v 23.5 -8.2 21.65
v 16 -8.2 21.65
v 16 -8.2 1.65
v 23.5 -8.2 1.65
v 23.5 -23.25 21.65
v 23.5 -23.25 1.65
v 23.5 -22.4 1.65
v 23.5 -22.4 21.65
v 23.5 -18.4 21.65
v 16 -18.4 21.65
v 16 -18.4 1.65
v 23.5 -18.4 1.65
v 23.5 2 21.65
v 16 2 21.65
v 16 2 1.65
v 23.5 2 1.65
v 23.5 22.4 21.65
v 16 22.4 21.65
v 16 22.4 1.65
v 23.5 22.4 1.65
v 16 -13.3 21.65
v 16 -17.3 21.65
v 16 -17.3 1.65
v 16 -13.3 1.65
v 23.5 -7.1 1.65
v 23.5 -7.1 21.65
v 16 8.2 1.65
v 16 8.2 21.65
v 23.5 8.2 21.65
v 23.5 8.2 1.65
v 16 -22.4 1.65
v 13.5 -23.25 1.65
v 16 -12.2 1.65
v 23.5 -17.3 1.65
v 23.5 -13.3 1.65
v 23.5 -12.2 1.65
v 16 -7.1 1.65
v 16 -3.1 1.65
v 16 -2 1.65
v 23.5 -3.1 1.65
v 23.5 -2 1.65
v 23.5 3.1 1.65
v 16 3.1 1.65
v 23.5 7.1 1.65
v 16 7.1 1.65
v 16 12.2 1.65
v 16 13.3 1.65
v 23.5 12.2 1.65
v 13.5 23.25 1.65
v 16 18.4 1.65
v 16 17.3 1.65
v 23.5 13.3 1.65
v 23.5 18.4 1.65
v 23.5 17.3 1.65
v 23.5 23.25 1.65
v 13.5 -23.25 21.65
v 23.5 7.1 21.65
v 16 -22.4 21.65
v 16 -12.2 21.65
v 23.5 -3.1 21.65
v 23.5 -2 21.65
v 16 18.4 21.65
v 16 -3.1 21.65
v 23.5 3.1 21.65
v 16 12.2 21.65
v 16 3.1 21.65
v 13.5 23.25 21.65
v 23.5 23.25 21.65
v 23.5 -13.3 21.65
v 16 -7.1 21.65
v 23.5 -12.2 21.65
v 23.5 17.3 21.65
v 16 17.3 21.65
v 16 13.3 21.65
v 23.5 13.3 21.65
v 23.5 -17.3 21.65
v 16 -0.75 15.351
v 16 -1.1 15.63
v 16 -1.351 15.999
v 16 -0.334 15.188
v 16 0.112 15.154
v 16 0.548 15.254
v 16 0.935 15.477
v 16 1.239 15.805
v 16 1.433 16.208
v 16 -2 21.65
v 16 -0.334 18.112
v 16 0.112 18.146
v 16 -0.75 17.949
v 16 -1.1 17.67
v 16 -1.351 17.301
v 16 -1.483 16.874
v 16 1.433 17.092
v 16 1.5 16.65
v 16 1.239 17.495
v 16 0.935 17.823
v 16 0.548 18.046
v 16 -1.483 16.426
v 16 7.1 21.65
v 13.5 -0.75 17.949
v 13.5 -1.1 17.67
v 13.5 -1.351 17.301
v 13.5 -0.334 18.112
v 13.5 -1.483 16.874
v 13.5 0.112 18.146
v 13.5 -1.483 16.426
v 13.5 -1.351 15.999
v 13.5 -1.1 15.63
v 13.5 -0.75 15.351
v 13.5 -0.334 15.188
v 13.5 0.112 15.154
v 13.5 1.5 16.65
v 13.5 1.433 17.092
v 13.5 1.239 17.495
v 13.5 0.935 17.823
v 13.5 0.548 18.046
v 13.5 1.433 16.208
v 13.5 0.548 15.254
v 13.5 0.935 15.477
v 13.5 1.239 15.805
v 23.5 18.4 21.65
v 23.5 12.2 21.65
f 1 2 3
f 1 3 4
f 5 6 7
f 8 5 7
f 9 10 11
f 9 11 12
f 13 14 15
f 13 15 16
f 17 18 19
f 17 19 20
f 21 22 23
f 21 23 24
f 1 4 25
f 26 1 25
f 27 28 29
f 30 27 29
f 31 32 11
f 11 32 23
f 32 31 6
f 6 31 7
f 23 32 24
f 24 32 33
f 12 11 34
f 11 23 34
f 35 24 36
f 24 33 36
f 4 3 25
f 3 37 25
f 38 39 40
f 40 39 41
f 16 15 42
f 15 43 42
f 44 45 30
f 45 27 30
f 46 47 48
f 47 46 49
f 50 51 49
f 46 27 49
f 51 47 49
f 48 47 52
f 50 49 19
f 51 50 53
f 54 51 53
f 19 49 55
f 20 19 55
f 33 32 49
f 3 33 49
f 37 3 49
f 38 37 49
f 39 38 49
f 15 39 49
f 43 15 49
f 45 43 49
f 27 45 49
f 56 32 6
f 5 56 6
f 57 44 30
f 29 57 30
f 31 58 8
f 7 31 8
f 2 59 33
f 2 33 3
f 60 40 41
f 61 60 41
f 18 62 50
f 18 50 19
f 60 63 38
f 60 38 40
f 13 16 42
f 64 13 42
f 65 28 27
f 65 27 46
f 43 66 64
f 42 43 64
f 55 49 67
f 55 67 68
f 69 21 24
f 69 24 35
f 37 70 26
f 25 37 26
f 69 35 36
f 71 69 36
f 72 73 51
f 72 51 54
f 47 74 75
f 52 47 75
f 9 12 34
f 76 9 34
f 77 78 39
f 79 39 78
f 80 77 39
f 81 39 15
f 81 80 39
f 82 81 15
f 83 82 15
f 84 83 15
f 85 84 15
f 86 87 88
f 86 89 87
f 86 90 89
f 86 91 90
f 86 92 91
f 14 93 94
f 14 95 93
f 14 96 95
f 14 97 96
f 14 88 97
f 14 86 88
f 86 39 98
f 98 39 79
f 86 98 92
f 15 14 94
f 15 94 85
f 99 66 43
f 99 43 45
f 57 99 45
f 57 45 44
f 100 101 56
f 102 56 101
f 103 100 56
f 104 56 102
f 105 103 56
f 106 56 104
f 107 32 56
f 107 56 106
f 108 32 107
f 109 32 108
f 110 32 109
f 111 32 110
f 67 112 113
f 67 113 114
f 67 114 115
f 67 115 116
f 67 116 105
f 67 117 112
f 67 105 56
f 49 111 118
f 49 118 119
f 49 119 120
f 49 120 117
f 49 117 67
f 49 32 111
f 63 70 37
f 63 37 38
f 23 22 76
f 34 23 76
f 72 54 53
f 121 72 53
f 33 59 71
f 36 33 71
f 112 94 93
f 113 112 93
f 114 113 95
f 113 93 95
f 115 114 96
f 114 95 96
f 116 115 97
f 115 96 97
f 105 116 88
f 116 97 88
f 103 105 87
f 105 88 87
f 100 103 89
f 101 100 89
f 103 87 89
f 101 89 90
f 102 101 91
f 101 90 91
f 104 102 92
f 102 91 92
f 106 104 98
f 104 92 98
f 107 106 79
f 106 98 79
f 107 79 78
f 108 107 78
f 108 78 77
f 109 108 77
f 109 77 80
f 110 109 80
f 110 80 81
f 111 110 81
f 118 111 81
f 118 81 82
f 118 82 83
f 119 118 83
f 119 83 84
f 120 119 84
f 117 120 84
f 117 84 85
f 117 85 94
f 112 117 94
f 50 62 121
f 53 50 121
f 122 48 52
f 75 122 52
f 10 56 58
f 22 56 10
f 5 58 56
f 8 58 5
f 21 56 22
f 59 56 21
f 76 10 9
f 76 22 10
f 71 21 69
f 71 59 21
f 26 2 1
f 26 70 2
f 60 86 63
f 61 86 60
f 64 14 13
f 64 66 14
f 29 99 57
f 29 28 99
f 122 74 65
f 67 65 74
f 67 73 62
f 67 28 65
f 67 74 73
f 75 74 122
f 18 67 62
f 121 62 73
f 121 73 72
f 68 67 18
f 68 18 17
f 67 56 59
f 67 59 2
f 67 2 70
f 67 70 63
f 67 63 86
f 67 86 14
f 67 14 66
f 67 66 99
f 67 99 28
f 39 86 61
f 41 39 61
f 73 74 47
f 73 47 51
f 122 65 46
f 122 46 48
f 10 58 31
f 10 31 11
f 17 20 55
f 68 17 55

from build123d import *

# Parameters (mm, degrees)
SKETCH002_W     = 10
SKETCH002_H     = 46.5
PAD001_DEPTH    = 20
SKETCH003_W     = 10
SKETCH003_H     = 4
POCKET001_DEPTH = 20
SKETCH004_R     = 1.5
POCKET002_DEPTH = 5


with BuildPart() as part:
    # Sketch002 → Pad001 (new body)
    with BuildSketch(Plane.XY):
        Rectangle(SKETCH002_W, SKETCH002_H)
    extrude(amount=PAD001_DEPTH)

    # Sketch003 (on Face6 of Pad001) → Pocket001 (cut)
    with BuildSketch(Plane.XY.offset(20)):
        with Locations((2.5, 20.4)):
            Rectangle(SKETCH003_W, SKETCH003_H)
        with Locations((2.5, 10.2)):
            Rectangle(SKETCH003_W, SKETCH003_H)
        with Locations((2.5, 15.3)):
            Rectangle(SKETCH003_W, SKETCH003_H)
        with Locations((2.5, 5.1)):
            Rectangle(SKETCH003_W, SKETCH003_H)
        with Locations((2.5, 0)):
            Rectangle(SKETCH003_W, SKETCH003_H)
        with Locations((2.5, -20.4)):
            Rectangle(SKETCH003_W, SKETCH003_H)
        with Locations((2.5, -15.3)):
            Rectangle(SKETCH003_W, SKETCH003_H)
        with Locations((2.5, -10.2)):
            Rectangle(SKETCH003_W, SKETCH003_H)
        with Locations((2.5, -5.1)):
            Rectangle(SKETCH003_W, SKETCH003_H)
    extrude(amount=-POCKET001_DEPTH, mode=Mode.SUBTRACT)

    # Sketch004 (on Face26 of Pocket001) → Pocket002 (cut)
    with BuildSketch(Plane.YZ.offset(-2.5)):
        with Locations((0, 15)):
            Circle(SKETCH004_R)
    extrude(amount=-POCKET002_DEPTH, mode=Mode.SUBTRACT)


with BuildPart() as part_1:
    # Body001 placement: moved
    add(part.part.moved(Location((18.5, 0, 1.65))))


solid = part_1.part
